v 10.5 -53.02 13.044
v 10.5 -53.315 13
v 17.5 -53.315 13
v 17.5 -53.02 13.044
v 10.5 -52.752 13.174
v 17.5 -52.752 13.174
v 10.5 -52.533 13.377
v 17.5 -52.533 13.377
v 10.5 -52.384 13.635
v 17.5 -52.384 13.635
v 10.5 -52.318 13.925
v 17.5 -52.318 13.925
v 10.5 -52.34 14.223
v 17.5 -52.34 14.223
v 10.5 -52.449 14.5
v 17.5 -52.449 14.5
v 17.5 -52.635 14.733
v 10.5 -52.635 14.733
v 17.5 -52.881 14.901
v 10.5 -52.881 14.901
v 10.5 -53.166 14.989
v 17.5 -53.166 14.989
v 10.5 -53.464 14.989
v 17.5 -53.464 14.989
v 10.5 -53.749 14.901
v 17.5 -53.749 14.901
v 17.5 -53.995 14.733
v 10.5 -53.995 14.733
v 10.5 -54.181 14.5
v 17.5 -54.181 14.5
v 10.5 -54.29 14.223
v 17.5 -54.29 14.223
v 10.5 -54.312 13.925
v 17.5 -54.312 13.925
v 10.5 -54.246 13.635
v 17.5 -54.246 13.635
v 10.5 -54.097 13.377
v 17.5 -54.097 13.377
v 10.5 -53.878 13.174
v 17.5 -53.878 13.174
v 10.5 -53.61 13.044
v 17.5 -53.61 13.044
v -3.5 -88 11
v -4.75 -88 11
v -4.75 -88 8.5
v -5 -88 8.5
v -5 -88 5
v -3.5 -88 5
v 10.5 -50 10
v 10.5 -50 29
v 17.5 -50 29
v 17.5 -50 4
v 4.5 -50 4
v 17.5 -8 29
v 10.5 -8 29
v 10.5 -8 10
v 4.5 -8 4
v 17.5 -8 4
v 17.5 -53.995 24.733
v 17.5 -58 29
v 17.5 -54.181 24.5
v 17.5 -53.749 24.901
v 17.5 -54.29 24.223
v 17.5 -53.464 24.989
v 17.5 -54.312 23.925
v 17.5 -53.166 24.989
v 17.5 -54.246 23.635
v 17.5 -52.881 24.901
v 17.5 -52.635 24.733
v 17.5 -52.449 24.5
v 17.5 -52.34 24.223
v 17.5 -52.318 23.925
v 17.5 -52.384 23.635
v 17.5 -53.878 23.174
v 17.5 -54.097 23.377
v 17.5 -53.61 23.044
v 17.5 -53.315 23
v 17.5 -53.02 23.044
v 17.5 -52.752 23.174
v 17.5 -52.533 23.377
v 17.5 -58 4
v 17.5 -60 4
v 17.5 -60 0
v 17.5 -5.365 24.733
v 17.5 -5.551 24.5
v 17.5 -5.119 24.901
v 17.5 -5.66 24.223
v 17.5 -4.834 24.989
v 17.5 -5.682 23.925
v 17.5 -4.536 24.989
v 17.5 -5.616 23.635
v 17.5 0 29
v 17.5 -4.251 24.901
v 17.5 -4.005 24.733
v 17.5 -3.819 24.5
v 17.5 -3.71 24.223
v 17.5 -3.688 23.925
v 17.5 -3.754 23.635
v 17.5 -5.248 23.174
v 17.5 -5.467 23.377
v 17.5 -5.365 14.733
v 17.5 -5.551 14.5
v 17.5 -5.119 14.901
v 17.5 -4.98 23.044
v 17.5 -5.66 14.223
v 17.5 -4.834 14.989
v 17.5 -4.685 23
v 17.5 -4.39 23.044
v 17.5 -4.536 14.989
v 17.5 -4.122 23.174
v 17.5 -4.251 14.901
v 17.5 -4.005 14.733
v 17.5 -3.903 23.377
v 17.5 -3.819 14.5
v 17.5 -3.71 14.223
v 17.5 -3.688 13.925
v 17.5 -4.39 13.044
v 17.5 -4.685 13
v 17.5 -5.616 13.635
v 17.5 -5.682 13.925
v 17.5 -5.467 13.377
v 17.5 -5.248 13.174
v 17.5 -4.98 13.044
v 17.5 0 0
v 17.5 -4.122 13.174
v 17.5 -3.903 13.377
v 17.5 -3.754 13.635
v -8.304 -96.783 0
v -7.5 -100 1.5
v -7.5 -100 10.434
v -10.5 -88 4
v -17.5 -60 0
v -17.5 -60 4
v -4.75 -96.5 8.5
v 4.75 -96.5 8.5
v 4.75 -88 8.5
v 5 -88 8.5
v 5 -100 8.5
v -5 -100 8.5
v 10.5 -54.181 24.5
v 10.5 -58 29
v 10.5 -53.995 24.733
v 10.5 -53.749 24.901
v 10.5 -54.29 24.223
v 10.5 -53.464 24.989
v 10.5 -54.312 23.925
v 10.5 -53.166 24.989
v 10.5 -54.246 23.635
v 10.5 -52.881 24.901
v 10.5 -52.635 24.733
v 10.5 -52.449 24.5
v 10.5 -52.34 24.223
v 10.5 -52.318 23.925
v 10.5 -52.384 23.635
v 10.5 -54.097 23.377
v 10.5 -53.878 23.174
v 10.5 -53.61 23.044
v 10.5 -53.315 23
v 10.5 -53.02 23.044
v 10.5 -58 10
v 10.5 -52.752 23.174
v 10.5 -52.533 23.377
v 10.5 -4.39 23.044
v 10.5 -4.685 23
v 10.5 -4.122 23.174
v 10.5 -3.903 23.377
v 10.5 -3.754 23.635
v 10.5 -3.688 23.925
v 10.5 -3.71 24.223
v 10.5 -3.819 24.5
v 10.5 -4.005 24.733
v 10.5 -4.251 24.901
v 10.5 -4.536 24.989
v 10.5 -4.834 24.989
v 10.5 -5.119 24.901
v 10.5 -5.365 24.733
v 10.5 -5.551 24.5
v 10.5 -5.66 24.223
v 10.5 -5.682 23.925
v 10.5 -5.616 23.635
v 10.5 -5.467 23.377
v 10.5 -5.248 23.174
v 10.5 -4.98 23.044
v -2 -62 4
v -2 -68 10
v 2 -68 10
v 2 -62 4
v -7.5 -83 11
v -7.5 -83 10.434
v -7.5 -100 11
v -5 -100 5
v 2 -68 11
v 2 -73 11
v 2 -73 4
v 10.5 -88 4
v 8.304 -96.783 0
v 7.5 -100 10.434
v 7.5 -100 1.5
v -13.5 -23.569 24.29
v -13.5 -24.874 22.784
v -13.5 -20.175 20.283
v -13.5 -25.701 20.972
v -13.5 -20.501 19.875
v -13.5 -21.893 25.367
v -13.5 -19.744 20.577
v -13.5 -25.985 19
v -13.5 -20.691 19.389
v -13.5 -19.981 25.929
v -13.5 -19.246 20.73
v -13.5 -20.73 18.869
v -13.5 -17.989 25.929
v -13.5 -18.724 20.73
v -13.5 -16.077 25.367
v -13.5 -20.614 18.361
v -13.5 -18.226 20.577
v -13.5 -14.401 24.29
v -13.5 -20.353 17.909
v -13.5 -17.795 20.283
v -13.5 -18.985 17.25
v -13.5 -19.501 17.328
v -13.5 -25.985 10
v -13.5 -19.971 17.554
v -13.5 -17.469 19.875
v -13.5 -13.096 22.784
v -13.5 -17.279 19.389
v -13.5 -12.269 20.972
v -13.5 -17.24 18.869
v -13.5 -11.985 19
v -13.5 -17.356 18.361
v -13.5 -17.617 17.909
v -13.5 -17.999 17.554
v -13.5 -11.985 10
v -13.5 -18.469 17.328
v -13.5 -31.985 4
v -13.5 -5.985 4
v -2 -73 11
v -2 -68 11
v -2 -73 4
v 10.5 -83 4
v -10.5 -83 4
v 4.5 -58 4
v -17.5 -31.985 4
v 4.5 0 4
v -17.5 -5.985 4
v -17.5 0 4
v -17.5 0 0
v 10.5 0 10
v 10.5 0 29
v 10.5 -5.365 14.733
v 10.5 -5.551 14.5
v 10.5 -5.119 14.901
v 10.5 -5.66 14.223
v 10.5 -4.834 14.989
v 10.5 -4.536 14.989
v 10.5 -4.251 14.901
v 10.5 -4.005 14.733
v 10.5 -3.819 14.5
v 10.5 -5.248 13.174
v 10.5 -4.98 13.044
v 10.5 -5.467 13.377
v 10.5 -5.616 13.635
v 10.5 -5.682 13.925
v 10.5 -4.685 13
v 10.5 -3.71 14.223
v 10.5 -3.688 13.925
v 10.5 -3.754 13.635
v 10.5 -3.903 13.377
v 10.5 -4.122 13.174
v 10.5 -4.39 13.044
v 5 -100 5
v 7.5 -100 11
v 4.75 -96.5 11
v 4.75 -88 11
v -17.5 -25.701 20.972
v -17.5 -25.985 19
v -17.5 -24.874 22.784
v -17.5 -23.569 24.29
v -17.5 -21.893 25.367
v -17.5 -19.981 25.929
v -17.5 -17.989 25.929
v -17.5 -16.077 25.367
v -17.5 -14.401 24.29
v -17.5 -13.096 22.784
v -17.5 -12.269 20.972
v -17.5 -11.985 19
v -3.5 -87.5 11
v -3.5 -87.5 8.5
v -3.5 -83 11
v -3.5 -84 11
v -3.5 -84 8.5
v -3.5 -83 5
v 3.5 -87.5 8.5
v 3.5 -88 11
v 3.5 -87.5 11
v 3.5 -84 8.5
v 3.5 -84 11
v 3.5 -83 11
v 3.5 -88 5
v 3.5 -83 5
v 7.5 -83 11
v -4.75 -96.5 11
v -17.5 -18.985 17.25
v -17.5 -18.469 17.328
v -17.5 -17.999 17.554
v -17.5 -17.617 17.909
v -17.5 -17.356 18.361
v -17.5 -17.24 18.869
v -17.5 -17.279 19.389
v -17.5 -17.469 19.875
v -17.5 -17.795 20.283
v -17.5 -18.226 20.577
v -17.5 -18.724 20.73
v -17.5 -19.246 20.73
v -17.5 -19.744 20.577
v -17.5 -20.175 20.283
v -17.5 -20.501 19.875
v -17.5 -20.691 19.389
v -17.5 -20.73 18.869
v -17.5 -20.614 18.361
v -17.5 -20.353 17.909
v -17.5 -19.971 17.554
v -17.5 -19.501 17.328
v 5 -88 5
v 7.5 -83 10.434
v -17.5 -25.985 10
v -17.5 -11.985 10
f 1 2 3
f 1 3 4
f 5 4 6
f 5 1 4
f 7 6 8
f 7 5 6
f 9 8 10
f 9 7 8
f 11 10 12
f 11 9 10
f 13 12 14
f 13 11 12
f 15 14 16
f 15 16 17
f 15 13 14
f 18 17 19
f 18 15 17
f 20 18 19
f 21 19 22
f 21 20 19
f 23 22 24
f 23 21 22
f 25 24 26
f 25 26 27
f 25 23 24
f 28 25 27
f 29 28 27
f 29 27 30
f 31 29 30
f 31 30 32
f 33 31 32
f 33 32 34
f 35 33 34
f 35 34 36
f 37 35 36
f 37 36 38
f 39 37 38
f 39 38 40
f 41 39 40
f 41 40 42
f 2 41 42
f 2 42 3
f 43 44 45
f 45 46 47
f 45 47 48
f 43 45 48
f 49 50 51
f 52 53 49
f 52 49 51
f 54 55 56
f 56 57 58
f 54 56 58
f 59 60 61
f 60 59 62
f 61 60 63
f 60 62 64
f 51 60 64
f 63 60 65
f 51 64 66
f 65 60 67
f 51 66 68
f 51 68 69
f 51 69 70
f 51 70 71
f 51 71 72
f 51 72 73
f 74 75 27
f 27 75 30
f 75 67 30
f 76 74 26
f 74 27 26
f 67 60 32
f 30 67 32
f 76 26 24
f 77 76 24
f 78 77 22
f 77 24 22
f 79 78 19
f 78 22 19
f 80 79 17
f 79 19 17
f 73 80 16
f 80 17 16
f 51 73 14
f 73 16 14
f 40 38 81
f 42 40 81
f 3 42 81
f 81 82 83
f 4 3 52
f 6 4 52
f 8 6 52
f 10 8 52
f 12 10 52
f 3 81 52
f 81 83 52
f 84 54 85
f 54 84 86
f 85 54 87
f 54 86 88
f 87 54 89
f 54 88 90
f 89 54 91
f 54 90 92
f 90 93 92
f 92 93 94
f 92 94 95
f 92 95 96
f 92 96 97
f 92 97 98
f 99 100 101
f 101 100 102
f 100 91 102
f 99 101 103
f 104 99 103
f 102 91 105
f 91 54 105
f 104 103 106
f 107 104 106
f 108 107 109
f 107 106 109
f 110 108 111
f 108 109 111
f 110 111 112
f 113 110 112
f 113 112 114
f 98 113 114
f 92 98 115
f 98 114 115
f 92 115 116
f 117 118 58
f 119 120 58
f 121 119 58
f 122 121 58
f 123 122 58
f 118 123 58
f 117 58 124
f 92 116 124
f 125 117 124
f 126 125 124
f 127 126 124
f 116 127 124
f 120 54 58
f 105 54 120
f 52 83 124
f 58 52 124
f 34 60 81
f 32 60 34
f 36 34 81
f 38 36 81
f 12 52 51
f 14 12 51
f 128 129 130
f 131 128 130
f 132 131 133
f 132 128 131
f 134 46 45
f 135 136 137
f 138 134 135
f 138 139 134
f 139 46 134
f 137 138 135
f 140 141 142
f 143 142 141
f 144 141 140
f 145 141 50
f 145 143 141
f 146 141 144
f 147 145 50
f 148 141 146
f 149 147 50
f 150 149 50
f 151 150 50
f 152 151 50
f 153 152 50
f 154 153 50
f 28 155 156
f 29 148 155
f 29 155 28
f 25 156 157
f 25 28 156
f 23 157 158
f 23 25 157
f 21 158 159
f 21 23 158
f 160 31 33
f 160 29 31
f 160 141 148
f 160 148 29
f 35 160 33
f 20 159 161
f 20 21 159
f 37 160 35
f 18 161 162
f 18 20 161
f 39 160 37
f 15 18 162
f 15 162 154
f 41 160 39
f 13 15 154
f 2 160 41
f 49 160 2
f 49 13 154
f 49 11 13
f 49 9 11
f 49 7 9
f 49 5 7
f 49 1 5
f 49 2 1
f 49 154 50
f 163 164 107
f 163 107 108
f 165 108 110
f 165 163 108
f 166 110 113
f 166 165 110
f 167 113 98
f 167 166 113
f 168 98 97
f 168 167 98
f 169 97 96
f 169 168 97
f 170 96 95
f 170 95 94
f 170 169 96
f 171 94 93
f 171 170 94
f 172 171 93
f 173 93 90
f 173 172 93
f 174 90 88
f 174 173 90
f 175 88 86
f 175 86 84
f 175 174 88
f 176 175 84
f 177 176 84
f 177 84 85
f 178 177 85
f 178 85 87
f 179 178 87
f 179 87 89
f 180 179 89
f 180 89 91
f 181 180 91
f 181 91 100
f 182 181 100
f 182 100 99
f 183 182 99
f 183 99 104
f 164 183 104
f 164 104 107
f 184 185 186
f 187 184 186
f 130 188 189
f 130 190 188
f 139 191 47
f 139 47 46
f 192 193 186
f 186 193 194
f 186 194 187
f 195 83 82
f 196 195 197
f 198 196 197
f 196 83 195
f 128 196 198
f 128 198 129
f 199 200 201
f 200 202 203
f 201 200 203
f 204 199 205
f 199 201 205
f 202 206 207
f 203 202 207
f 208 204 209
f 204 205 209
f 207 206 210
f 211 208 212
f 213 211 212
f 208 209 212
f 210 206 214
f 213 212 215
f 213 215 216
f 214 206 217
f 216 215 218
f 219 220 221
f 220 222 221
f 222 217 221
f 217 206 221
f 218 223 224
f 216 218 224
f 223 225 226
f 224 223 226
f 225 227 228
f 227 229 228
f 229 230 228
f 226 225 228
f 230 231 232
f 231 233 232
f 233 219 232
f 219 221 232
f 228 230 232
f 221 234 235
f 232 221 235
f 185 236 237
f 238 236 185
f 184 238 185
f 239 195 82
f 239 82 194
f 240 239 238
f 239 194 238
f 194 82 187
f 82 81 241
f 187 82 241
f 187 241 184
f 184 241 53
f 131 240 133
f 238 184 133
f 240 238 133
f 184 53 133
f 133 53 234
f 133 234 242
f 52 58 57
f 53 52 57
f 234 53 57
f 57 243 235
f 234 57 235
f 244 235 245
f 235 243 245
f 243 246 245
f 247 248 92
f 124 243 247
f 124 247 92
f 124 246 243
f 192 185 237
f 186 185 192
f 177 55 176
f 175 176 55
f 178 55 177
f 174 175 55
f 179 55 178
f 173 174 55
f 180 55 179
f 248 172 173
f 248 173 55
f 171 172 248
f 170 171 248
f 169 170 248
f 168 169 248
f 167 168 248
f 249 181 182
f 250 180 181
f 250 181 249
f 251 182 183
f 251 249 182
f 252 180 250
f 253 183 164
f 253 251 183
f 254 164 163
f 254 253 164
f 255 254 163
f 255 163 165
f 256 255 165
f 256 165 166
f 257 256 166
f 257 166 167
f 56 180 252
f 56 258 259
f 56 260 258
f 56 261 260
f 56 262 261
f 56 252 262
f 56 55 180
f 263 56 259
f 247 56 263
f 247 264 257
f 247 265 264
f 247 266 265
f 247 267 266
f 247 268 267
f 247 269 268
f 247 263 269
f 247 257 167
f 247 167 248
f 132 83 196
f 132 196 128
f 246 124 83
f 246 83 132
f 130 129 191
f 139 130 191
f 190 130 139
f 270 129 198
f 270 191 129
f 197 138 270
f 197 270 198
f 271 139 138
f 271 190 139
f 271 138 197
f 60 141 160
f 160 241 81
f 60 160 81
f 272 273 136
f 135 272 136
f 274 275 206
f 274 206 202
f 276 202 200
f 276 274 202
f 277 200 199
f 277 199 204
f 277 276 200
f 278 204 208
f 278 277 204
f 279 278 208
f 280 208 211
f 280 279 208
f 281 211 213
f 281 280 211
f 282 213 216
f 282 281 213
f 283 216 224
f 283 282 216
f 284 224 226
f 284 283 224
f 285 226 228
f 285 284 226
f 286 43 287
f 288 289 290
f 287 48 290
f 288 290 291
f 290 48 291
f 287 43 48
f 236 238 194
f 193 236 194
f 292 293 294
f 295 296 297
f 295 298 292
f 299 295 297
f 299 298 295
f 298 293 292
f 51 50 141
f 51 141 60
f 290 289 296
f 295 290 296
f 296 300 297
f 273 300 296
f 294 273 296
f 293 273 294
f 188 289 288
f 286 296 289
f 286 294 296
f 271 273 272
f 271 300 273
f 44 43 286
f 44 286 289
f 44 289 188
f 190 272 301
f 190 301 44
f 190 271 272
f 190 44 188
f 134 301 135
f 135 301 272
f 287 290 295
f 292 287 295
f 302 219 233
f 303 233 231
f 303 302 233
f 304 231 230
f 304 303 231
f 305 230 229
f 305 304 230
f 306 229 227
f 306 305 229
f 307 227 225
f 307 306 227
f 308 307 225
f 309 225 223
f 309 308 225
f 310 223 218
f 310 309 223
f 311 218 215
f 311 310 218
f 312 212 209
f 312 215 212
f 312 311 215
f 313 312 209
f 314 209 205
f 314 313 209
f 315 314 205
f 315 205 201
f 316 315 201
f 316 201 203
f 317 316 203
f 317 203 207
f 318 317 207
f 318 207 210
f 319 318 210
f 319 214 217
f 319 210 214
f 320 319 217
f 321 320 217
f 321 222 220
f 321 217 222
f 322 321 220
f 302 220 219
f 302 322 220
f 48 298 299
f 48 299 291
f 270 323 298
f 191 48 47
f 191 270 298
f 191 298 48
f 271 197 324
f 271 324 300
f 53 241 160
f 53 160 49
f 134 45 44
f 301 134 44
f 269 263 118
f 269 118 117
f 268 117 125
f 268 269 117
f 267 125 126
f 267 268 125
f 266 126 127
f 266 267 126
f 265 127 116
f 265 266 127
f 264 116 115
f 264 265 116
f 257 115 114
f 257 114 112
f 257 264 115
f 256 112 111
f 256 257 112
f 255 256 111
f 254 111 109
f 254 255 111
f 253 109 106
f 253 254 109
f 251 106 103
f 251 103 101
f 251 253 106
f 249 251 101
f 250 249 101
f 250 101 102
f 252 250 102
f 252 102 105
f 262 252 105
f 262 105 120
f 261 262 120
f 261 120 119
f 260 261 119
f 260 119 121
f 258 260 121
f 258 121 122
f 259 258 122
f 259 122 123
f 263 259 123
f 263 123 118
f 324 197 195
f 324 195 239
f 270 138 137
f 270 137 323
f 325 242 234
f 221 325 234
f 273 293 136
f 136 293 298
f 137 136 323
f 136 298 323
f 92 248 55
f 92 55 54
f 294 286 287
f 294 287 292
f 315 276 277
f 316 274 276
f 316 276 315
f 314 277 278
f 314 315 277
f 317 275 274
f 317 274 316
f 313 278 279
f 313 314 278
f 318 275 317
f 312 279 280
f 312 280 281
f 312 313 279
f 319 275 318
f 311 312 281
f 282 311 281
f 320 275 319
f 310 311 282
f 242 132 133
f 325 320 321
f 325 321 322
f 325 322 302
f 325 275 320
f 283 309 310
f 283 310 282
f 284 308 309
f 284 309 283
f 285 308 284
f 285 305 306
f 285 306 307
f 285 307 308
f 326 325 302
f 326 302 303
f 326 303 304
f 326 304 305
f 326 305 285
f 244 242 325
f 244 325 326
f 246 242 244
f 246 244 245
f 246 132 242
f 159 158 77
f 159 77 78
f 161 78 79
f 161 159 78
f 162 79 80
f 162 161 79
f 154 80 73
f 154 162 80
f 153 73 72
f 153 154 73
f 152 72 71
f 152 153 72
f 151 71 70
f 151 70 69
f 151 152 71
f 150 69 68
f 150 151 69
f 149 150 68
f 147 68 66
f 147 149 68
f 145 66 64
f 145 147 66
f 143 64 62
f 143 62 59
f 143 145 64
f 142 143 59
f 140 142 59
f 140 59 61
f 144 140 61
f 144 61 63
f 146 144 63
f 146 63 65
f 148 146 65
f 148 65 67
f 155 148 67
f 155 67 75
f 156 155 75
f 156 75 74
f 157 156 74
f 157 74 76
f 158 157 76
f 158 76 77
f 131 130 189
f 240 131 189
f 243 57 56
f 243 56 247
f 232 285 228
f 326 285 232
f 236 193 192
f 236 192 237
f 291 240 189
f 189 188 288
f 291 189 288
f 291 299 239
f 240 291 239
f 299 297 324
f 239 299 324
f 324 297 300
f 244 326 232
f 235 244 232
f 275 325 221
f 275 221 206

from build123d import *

# Parameters (mm, degrees)
RESSALTO_EXTRUS_O1_DEPTH    = 4
ESBO_O2_W                   = 7
ESBO_O2_H                   = 8
ESBO_O2_W_2                 = 4
ESBO_O2_H_2                 = 16
RESSALTO_EXTRUS_O2_DEPTH    = 25
CORTE_EXTRUS_O1_START       = -35
CORTE_EXTRUS_O1_OUTLINE_R   = 1.75
CORTE_EXTRUS_O1_OUTLINE_R_2 = 1
CORTE_EXTRUS_O1_DEPTH       = 35
RESSALTO_EXTRUS_O3_DEPTH    = 17
RESSALTO_EXTRUS_O4_REACH    = 106.553
ESBO_O7_W                   = 4
ESBO_O7_H                   = 5
ESBO_O8_W                   = 15
ESBO_O8_H                   = 3.5
RESSALTO_EXTRUS_O5_DEPTH    = 2.5
CHANFRO1_SIZE               = 6
CHANFRO2_SIZE               = 3
CHANFRO2_SIZE2              = 6.433520762
CHANFRO3_SIZE               = 1.5
CHANFRO3_SIZE2              = 3.216760381


# Read off the part's stored shape, not the designer's step: Corte-extrusão1
with BuildPart() as part:
    # Esboço1 → Ressalto-extrusão1 (new body)
    with BuildSketch(Plane.XY):
        Polygon((-17.5, 0), (17.5, 0), (17.5, -60), (7.5, -100), (-7.5, -100), (-17.5, -60), align=None)
    extrude(amount=RESSALTO_EXTRUS_O1_DEPTH)

    # Esboço2 → Ressalto-extrusão2 (add)
    with BuildSketch(Plane.XY.offset(4)):
        with Locations((14, -54)):
            Rectangle(ESBO_O2_W, ESBO_O2_H)
        with Locations((14, -4)):
            Rectangle(ESBO_O2_W, ESBO_O2_H)
        with Locations((-15.5, -19)):
            Rectangle(ESBO_O2_W_2, ESBO_O2_H_2)
    extrude(amount=RESSALTO_EXTRUS_O2_DEPTH)

    # Corte-extrusão1 outline → Corte-extrusão1 (cut)
    with BuildSketch(Plane(origin=(17.5, 0, 0), x_dir=(0, 0, -1), z_dir=(1, 0, 0)).offset(CORTE_EXTRUS_O1_START)):
        with Locations((-19, -18.985)):
            Circle(CORTE_EXTRUS_O1_OUTLINE_R)
        with BuildLine():
            ThreePointArc((-19, -25.985), (-26, -18.985), (-19, -11.985))
            Line((-19, -11.985), (-4, -11.985))
            Line((-4, -11.985), (-4, -11))
            Line((-4, -11), (-29, -11))
            Line((-29, -11), (-29, -27))
            Line((-29, -27), (-4, -27))
            Line((-4, -27), (-4, -25.985))
            Line((-4, -25.985), (-19, -25.985))
        make_face()
        with Locations((-24, -4.685)):
            Circle(CORTE_EXTRUS_O1_OUTLINE_R_2)
        with Locations((-14, -4.685)):
            Circle(CORTE_EXTRUS_O1_OUTLINE_R_2)
        with Locations((-14, -53.315)):
            Circle(CORTE_EXTRUS_O1_OUTLINE_R_2)
        with Locations((-24, -53.315)):
            Circle(CORTE_EXTRUS_O1_OUTLINE_R_2)
    extrude(amount=CORTE_EXTRUS_O1_DEPTH, mode=Mode.SUBTRACT)

    # Esboço6 → Ressalto-extrusão3 (add)
    with BuildSketch(Plane.XZ.offset(100)):
        Polygon((-5, 5), (-5, 8.5), (-4.75, 8.5), (-4.75, 11), (-7.5, 11), (-7.5, 4), (7.5, 4), (7.5, 11), (4.75, 11), (4.75, 8.5), (5, 8.5), (5, 5), align=None)
    extrude(amount=-RESSALTO_EXTRUS_O3_DEPTH)

    # Ressalto-extrusão4: up to this face of the body (flat: up to its plane)
    ressalto_extrus_o4_end = Plane(part.part.faces().sort_by_distance((-6.125, -91.5, 11))[0])
    # Esboço7 → Ressalto-extrusão4 (add, up to the picked face)
    with BuildSketch(Plane.XY.offset(4), mode=Mode.PRIVATE) as ressalto_extrus_o4_sk1:
        with Locations((0, -70.5)):
            Rectangle(ESBO_O7_W, ESBO_O7_H)
    ressalto_extrus_o4_tool1 = split(extrude(ressalto_extrus_o4_sk1.sketch, amount=RESSALTO_EXTRUS_O4_REACH, mode=Mode.PRIVATE), bisect_by=ressalto_extrus_o4_end, keep=Keep.BOTH, mode=Mode.PRIVATE)
    # Esboço7 → Ressalto-extrusão4 (add, up to the picked face)
    with BuildSketch(Plane.XY.offset(4), mode=Mode.PRIVATE) as ressalto_extrus_o4_sk2:
        with Locations((5.5, -85.5)):
            Rectangle(ESBO_O7_W, ESBO_O7_H)
    ressalto_extrus_o4_tool2 = split(extrude(ressalto_extrus_o4_sk2.sketch, amount=RESSALTO_EXTRUS_O4_REACH, mode=Mode.PRIVATE), bisect_by=ressalto_extrus_o4_end, keep=Keep.BOTH, mode=Mode.PRIVATE)
    # Esboço7 → Ressalto-extrusão4 (add, up to the picked face)
    with BuildSketch(Plane.XY.offset(4), mode=Mode.PRIVATE) as ressalto_extrus_o4_sk3:
        with Locations((-5.5, -85.5)):
            Rectangle(ESBO_O7_W, ESBO_O7_H)
    ressalto_extrus_o4_tool3 = split(extrude(ressalto_extrus_o4_sk3.sketch, amount=RESSALTO_EXTRUS_O4_REACH, mode=Mode.PRIVATE), bisect_by=ressalto_extrus_o4_end, keep=Keep.BOTH, mode=Mode.PRIVATE)
    add(ressalto_extrus_o4_tool1.solids().sort_by(Axis((0, -70.5, 4), (0, 0, 1)))[0])
    add(ressalto_extrus_o4_tool2.solids().sort_by(Axis((5.5, -85.5, 4), (0, 0, 1)))[0])
    add(ressalto_extrus_o4_tool3.solids().sort_by(Axis((-5.5, -85.5, 4), (0, 0, 1)))[0])

    # Esboço8 → Ressalto-extrusão5 (add)
    with BuildSketch(Plane.XY.offset(11)):
        with Locations((0, -98.25)):
            Rectangle(ESBO_O8_W, ESBO_O8_H)
        with Locations((0, -85.75)):
            Rectangle(ESBO_O8_W, ESBO_O8_H)
    extrude(amount=-RESSALTO_EXTRUS_O5_DEPTH)

    # Chanfro1
    chanfro1_edges = [part.edges().sort_by_distance(p)[0] for p in [
        (0, -68, 4),
        (10.5, -54, 4),
        (10.5, -4, 4),
        (-15.5, -11.985, 4),
        (-15.5, -25.985, 4),
    ]]
    chamfer(chanfro1_edges, length=CHANFRO1_SIZE)

    # Chanfro2
    chanfro2_edges = [part.edges().sort_by_distance(p)[0] for p in [
        (7.5, -91.5, 4),
        (-7.5, -91.5, 4),
    ]]
    chanfro2_side = [part.faces().sort_by_distance(p)[0] for p in [
        (-0.271595018, -42.597184947, 4),
    ]]
    chamfer(chanfro2_edges, length=CHANFRO2_SIZE, length2=CHANFRO2_SIZE2, reference=chanfro2_side[0])

    # Chanfro3
    chanfro3_edges = [part.edges().sort_by_distance(p)[0] for p in [
        (0, -100, 0),
    ]]
    chanfro3_side = [part.faces().sort_by_distance(p)[0] for p in [
        (7.313989248, -100, 10.716760381),
    ]]
    chamfer(chanfro3_edges, length=CHANFRO3_SIZE, length2=CHANFRO3_SIZE2, reference=chanfro3_side[0])


solid = part.part
